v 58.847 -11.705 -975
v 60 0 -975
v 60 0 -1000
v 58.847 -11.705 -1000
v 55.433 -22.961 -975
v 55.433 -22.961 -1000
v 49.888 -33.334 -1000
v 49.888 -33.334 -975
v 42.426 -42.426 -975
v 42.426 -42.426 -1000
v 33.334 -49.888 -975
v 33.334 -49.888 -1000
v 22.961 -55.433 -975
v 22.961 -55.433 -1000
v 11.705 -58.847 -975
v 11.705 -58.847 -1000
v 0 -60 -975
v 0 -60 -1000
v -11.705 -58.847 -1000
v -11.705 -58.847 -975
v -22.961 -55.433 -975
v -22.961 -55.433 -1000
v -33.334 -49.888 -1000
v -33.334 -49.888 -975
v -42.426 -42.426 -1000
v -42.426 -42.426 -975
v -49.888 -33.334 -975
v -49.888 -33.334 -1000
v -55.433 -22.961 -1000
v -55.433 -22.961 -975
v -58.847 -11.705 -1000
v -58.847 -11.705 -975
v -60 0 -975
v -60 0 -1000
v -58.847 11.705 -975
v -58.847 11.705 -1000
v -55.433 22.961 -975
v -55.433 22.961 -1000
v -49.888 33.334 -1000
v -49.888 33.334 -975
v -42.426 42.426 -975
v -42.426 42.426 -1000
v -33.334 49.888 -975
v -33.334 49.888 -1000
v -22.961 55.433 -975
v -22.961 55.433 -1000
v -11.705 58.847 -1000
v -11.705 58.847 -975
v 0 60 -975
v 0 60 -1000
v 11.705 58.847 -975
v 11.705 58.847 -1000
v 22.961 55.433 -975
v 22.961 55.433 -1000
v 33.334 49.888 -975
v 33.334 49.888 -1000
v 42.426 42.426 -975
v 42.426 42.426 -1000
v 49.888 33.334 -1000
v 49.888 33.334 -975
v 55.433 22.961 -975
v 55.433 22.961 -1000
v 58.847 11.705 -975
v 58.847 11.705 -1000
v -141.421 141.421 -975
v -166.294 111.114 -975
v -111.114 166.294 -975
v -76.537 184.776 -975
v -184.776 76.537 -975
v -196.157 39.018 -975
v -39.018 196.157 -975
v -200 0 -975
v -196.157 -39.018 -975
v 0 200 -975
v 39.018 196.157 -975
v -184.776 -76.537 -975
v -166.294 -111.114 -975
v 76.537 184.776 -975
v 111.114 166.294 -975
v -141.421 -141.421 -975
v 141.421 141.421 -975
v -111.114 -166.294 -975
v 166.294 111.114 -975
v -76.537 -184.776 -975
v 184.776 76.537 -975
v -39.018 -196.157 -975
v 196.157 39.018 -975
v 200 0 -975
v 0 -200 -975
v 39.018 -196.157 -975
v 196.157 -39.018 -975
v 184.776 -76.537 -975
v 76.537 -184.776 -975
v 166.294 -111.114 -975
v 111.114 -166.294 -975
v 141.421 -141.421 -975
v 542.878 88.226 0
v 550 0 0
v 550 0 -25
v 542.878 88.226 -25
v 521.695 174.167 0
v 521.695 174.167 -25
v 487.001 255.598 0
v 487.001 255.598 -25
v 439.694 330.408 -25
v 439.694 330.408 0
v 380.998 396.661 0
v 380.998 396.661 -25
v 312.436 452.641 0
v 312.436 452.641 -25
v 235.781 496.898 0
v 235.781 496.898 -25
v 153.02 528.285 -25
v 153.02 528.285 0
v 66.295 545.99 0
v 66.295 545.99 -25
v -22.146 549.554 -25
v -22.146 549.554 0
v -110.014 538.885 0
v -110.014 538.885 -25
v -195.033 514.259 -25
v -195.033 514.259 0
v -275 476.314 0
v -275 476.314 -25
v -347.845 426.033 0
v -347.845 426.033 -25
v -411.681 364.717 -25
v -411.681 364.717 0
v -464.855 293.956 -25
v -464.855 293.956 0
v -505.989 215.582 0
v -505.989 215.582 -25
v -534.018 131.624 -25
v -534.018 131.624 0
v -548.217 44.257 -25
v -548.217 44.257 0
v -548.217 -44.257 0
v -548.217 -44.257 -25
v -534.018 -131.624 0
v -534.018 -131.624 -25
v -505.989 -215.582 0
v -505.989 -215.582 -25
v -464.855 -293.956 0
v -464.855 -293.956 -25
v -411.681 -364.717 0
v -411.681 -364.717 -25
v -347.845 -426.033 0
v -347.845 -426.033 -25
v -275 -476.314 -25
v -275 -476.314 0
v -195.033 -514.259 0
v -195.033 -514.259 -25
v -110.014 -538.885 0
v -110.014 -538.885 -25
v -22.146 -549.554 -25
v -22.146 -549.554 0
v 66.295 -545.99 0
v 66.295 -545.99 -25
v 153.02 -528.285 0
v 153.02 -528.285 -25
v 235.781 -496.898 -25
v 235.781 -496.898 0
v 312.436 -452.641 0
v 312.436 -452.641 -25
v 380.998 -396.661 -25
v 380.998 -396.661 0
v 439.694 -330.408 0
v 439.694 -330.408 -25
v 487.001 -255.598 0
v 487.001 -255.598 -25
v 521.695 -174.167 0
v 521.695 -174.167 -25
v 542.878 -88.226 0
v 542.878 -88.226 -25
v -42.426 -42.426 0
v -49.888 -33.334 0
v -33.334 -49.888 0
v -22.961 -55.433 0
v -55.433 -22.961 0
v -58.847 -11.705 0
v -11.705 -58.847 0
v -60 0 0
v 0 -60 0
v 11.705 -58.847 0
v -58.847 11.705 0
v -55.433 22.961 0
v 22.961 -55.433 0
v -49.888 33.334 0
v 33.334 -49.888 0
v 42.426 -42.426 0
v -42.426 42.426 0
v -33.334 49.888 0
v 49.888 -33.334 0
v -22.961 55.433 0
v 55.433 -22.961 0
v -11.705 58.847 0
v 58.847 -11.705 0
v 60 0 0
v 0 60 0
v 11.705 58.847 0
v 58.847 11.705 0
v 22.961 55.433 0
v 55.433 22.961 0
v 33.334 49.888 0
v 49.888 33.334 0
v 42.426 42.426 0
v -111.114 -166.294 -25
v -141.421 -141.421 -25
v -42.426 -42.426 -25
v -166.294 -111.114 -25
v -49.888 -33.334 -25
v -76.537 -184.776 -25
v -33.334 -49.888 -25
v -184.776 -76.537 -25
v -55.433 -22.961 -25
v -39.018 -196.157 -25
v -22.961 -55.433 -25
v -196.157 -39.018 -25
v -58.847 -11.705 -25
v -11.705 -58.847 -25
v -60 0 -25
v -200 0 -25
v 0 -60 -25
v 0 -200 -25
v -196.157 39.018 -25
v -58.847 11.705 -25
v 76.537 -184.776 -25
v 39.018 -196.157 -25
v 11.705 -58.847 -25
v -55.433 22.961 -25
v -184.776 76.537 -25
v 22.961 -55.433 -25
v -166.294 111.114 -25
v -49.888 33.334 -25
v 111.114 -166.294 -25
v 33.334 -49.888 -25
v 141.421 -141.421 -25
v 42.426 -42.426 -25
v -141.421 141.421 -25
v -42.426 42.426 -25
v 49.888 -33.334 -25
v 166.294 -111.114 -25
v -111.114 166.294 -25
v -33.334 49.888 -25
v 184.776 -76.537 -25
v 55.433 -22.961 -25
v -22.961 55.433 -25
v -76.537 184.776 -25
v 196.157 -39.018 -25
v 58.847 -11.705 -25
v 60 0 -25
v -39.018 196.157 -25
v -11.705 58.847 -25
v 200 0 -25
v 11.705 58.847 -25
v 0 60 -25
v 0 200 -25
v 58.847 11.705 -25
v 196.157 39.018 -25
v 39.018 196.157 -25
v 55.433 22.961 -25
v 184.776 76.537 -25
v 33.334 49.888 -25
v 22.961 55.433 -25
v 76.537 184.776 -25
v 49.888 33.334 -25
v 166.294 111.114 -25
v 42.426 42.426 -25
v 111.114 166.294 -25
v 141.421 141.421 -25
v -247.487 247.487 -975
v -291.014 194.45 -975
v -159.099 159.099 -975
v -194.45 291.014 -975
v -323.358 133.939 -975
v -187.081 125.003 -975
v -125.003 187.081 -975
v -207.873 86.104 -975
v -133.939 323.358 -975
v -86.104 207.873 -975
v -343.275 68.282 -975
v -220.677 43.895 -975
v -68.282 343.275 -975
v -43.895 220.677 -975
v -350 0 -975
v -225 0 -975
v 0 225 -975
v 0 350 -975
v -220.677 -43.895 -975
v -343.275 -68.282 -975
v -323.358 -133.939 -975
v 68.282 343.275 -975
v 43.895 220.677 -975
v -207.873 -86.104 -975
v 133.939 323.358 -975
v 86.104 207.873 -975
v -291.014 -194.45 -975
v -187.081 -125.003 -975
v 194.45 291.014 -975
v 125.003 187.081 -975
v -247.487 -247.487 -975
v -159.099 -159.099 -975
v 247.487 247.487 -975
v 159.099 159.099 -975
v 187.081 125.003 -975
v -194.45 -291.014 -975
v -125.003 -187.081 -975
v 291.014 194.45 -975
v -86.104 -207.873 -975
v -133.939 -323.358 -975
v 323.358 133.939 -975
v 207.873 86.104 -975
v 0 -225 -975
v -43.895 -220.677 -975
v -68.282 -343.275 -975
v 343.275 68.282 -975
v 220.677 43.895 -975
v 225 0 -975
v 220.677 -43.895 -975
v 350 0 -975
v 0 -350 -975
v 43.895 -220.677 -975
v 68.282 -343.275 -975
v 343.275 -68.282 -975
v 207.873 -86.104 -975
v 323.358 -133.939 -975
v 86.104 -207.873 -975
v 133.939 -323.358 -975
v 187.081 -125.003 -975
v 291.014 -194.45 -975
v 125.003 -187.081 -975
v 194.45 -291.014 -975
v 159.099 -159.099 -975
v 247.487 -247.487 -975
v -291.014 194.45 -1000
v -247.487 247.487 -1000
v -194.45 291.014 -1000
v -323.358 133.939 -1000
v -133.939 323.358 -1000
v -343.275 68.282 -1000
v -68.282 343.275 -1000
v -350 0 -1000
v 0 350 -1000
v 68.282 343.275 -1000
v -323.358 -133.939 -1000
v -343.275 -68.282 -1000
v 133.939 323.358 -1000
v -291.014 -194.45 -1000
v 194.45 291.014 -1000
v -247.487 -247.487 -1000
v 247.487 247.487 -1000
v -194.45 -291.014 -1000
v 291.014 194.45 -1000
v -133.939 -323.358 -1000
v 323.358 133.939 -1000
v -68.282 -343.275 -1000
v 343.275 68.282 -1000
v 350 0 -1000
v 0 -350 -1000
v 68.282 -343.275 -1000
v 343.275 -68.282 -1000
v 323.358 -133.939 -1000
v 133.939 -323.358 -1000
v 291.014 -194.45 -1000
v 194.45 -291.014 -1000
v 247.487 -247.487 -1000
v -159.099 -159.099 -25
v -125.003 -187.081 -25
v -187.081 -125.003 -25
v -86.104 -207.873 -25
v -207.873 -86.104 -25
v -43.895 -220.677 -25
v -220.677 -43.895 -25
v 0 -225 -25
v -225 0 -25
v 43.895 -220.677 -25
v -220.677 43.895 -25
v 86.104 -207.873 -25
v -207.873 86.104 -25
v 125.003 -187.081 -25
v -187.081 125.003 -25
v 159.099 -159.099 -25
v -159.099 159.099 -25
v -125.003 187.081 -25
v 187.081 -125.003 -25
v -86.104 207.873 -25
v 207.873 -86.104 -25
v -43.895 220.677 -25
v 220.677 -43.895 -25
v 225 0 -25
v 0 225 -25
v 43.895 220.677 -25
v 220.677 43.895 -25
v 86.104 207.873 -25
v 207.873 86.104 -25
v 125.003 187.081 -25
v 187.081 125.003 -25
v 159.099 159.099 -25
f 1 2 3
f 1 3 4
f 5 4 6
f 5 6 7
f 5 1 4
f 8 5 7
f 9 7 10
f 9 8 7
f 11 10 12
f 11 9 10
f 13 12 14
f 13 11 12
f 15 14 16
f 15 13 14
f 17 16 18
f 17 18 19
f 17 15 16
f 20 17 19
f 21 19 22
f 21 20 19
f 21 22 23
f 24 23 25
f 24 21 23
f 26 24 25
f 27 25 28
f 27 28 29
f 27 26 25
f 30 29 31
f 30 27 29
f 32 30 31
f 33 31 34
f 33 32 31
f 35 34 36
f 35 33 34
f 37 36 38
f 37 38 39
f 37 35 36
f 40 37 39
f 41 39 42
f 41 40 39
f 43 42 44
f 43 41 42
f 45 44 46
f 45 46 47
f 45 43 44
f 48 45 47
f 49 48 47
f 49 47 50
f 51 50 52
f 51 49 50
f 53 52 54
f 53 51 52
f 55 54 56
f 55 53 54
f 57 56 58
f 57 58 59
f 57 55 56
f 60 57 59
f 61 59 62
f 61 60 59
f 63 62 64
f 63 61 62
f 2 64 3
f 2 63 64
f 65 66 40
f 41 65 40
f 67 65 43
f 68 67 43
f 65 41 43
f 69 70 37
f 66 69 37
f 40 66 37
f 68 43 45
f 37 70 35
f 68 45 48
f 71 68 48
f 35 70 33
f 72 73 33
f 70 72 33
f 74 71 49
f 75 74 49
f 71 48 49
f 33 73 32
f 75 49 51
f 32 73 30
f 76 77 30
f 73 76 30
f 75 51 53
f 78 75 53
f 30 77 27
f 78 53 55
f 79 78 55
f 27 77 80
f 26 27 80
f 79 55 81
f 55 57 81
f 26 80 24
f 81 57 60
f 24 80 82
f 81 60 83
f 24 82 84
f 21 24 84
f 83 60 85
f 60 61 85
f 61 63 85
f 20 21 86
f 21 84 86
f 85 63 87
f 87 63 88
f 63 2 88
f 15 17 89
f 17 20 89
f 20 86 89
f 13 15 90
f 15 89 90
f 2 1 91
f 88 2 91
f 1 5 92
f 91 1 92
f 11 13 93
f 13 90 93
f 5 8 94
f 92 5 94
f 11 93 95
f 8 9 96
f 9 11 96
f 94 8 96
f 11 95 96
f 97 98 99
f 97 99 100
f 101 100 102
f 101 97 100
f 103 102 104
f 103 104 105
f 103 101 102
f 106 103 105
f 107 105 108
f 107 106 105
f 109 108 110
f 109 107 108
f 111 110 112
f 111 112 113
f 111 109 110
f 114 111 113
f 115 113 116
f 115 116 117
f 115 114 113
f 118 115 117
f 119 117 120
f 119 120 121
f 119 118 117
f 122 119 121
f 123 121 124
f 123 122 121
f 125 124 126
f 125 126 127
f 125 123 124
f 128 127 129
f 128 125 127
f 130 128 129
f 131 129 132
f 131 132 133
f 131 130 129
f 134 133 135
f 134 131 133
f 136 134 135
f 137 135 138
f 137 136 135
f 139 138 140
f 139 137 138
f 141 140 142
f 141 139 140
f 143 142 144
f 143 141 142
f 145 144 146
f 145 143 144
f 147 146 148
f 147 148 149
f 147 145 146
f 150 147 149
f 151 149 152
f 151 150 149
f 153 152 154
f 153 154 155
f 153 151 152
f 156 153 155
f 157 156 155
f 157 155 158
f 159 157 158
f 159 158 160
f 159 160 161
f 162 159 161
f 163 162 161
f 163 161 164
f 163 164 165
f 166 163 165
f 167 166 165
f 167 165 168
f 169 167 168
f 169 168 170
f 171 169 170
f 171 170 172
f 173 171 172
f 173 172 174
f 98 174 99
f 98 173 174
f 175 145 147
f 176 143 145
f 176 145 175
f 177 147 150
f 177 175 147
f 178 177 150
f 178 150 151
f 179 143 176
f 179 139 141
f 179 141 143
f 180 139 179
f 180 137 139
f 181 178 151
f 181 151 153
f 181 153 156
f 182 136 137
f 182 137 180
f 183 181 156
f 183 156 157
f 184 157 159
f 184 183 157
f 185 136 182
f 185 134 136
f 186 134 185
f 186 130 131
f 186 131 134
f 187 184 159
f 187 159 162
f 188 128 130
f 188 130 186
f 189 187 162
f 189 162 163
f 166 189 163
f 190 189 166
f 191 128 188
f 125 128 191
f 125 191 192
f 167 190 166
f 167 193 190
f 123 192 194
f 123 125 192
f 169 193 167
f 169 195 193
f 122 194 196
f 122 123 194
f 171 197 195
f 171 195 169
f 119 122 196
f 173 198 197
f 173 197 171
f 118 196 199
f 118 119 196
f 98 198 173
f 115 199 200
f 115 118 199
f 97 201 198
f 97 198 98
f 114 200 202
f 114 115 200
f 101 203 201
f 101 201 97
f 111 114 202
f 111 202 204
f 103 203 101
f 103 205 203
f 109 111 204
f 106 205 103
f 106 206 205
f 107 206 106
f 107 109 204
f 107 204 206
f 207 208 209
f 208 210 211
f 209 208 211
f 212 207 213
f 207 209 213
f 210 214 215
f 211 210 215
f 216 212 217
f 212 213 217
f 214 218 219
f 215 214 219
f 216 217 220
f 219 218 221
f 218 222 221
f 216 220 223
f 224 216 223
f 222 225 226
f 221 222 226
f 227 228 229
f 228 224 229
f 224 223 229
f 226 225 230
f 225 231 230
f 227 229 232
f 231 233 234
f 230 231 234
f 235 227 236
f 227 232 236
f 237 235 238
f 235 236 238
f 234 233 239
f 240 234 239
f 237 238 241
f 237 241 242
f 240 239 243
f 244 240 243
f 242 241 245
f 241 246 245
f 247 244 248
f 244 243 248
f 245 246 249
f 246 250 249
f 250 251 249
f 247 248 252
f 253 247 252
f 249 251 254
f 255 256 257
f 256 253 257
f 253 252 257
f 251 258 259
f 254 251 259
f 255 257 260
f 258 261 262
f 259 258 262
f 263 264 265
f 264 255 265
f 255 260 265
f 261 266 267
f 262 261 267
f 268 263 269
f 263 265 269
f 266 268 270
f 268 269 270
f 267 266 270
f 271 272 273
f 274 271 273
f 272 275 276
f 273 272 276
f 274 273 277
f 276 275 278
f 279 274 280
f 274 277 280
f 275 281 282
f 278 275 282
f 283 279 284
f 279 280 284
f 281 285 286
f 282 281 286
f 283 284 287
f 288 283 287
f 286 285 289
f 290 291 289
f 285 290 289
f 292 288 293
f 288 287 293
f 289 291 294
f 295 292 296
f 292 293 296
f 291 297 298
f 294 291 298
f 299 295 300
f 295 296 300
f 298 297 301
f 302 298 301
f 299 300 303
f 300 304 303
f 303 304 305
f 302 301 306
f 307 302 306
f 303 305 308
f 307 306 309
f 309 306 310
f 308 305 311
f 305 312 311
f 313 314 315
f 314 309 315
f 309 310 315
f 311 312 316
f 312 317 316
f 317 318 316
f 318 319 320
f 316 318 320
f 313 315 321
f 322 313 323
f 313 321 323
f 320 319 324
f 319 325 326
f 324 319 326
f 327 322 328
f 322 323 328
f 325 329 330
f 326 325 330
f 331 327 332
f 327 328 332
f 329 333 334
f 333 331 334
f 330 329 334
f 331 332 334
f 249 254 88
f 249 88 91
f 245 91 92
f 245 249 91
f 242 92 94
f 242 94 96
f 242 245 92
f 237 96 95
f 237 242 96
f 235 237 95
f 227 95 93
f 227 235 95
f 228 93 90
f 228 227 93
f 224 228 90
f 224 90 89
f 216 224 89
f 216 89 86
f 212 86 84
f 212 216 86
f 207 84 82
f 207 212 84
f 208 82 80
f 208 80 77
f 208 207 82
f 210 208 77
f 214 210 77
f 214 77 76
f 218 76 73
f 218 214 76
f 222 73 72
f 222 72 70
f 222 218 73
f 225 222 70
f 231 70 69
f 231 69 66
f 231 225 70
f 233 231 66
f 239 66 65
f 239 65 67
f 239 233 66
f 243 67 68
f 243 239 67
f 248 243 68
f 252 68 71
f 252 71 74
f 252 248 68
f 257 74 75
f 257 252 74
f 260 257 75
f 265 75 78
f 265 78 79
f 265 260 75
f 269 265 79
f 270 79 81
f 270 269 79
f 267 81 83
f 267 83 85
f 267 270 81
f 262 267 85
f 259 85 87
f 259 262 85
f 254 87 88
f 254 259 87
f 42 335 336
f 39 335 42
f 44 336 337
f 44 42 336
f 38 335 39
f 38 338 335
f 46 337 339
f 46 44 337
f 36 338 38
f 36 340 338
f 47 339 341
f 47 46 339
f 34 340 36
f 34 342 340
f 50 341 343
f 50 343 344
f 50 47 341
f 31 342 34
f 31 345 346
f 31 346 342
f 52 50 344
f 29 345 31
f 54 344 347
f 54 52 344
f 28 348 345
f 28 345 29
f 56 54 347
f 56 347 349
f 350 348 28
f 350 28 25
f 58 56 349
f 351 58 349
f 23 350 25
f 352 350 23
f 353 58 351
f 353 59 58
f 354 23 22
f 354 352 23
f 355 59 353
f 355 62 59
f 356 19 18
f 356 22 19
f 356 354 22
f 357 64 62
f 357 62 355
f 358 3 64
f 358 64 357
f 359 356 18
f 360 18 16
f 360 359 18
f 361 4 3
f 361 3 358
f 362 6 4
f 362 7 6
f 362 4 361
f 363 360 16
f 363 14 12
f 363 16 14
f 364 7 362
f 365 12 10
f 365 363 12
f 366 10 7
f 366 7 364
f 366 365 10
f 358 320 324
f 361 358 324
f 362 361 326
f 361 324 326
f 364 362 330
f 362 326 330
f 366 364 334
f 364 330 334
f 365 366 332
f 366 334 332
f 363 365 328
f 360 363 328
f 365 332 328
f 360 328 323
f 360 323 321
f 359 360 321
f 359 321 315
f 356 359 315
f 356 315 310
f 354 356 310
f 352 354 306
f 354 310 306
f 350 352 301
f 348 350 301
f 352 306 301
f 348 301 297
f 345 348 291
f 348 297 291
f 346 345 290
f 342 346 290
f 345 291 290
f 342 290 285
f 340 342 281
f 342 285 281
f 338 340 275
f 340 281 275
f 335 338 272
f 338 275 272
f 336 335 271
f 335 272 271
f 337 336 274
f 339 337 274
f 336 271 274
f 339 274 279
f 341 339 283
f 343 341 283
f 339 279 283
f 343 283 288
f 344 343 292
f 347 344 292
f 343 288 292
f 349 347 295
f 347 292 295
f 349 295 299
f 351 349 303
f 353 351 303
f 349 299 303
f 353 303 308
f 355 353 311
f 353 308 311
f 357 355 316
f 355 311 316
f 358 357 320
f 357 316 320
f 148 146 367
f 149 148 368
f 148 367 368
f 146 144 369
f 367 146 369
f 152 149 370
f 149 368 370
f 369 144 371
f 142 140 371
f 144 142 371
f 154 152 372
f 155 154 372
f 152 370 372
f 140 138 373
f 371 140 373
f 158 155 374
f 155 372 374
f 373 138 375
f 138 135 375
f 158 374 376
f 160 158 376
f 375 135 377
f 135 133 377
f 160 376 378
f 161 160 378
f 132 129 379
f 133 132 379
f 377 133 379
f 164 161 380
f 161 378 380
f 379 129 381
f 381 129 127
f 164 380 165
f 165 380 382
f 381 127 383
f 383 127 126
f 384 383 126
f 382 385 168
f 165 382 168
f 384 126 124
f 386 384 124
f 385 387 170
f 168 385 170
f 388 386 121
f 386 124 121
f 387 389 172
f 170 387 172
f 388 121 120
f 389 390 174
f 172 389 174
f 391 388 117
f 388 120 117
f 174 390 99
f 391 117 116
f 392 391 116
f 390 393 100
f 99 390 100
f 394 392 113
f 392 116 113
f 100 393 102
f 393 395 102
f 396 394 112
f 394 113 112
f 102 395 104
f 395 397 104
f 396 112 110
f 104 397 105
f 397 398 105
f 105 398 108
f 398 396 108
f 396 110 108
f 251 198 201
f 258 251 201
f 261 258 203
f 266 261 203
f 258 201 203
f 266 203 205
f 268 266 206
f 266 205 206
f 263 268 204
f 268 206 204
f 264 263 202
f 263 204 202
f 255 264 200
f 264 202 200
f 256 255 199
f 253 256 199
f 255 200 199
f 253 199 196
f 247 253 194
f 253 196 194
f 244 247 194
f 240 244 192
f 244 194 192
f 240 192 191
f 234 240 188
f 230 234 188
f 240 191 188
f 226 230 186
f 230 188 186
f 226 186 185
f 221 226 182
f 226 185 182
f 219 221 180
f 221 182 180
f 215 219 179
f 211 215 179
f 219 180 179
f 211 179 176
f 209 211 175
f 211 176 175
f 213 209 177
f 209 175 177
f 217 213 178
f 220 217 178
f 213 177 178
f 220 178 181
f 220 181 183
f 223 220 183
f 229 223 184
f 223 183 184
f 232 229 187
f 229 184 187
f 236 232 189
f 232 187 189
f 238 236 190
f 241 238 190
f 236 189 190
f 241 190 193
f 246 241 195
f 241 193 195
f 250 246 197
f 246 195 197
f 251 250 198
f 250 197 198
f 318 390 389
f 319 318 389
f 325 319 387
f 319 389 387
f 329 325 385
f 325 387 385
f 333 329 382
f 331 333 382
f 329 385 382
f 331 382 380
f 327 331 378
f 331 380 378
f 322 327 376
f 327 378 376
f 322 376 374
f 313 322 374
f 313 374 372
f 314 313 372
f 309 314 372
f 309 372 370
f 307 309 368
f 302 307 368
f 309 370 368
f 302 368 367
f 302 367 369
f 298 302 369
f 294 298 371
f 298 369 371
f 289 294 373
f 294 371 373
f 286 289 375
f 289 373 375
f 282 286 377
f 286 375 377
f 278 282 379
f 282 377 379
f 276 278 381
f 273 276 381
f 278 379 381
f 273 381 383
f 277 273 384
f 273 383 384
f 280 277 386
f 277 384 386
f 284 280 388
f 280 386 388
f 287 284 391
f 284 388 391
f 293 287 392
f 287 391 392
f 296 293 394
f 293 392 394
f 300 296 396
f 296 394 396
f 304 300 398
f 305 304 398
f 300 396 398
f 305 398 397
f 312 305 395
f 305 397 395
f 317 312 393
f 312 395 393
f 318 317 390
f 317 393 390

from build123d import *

# Parameters (mm, degrees)
F0_R     = 550
F0_R_2   = 60
F1_DEPTH = 25
F2_R     = 225
F2_R_2   = 200
F3_DEPTH = 950
F4_R     = 350
F4_R_2   = 225
F4_R_3   = 200
F4_R_4   = 60
F5_DEPTH = 25


with BuildPart() as f1:
    # F0 (on Top) → F1 (new body)
    with BuildSketch(Plane.XY):
        Circle(F0_R)
        Circle(F0_R_2, mode=Mode.SUBTRACT)
    extrude(amount=-F1_DEPTH)

    # F2 (on face) → F3 (join)
    with BuildSketch(Plane(origin=(0, 0, -25), x_dir=(1, 0, 0), z_dir=(0, 0, -1))):
        Circle(F2_R)
        Circle(F2_R_2, mode=Mode.SUBTRACT)
    extrude(amount=F3_DEPTH)

    # F4 (on face) → F5 (join)
    with BuildSketch(Plane(origin=(0, 0, -975), x_dir=(1, 0, 0), z_dir=(0, 0, -1))):
        Circle(F4_R)
        Circle(F4_R_2, mode=Mode.SUBTRACT)
        Circle(F4_R_2)
        Circle(F4_R_3, mode=Mode.SUBTRACT)
        Circle(F4_R_3)
        Circle(F4_R_4, mode=Mode.SUBTRACT)
    extrude(amount=F5_DEPTH)


solid = f1.part
